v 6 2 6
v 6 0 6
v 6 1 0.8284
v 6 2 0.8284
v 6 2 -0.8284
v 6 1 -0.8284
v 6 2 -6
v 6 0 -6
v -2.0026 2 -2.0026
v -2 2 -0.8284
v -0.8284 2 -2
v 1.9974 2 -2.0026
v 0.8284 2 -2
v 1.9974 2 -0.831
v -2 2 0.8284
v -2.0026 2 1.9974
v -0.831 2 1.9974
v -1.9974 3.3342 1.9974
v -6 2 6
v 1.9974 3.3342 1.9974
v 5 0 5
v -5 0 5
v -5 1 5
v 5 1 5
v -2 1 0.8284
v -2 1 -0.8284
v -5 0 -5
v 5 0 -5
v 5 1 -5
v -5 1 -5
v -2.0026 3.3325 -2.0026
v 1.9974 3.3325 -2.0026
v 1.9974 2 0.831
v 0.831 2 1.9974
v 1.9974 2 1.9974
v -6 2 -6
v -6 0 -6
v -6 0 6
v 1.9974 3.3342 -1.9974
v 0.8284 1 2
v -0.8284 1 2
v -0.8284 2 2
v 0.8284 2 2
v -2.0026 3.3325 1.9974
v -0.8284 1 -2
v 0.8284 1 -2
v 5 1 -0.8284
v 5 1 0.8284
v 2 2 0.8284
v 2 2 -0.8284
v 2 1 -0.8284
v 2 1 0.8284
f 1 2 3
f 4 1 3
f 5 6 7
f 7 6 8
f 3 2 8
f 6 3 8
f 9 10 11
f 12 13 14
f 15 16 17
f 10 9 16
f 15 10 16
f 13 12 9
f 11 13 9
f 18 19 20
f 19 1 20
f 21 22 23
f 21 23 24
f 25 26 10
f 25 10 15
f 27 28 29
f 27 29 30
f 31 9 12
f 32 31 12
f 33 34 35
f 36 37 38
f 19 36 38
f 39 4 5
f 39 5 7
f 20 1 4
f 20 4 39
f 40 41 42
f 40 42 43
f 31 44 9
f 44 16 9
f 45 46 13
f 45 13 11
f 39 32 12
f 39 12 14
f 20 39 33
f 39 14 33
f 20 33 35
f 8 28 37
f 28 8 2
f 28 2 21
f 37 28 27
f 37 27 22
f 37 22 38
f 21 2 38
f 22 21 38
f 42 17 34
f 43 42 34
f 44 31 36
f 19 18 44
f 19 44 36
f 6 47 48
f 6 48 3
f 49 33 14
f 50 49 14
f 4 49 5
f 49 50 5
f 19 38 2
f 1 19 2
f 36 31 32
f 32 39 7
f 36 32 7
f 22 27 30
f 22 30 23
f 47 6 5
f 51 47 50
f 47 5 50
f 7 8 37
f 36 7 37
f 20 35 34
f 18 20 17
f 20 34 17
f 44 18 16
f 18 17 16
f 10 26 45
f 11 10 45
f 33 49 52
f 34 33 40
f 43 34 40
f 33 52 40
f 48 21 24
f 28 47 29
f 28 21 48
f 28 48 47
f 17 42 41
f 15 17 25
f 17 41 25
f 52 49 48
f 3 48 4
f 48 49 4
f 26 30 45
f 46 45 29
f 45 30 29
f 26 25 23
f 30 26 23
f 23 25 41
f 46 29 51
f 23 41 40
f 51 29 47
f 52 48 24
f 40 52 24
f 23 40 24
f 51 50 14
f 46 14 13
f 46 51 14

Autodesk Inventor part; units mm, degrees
ref_plane "YZ Plane" through (0, 0, 0) normal (1, 0, 0) x (0, 1, 0)
ref_plane "XZ Plane" through (0, 0, 0) normal (0, 1, 0) x (-1, 0, 0)
ref_plane "XY Plane" through (0, 0, 0) normal (0, 0, 1) x (1, 0, 0)
sketch "Sketch1" plane through (0, 0, 0) normal (0, 1, 0) x (-1, 0, 0)
  line L0 (5, 5) -> (-5, 5)
  line L1 (-5, 5) -> (-5, -5)
  line L2 (-5, -5) -> (5, -5)
  line L3 (5, -5) -> (5, 5)
  line L4 (6, 6) -> (-6, 6)
  line L5 (-6, 6) -> (-6, -6)
  line L6 (-6, -6) -> (6, -6)
  line L7 (6, -6) -> (6, 6)
  point P0 (0, 0)
  dimension "d0" = 10
  dimension "d1" = 10
  dimension "d2" = 5
  dimension "d3" = 5
  dimension "d4" = 12
  dimension "d5" = 12
  dimension "d6" = 1
  dimension "d7" = 1
extrude "Extrusion1" add sketch "Sketch1" along normal blind 2
sketch "Sketch2" plane through (6, 0, 6) normal (1, 0, 0) x (0, 0, -1)
  line L0 (0, 0) -> (0, 2) projected
  line L1 (12, 0) -> (12, 2) projected
  line L2 (0, 2) -> (12, 2)
  line L3 (12, 2) -> (12, 1)
  line L4 (12, 1) -> (0, 1)
  line L5 (0, 1) -> (0, 2)
  point P0 (6, 0)
extrude "Extrusion2" add sketch "Sketch2" against normal blind 11.5
sketch "Sketch3" plane through (0, 2, 0) normal (0, 1, 0) x (1, 0, 0)
  line L0 (-2, -2) -> (2, -2)
  line L1 (2, -2) -> (2, 2)
  line L2 (2, 2) -> (-2, 2)
  line L3 (-2, 2) -> (-2, -2)
  circle A0 centre (0, 0) radius 2.8284
  line L4 (0, -2.8284) -> (-2.8284, 0)
  line L5 (-2.8284, 0) -> (0, 2.8284)
  line L6 (2.8284, 0) -> (0, 2.8284)
  line L7 (2.8284, 0) -> (0, -2.8284)
  point P0 (0.8284, -2)
  point P1 (2, -0.8284)
  point P2 (2, 0.8284)
  point P3 (0.8284, 2)
  point P4 (-0.8284, 2)
  point P5 (-2, 0.8284)
  point P6 (-2, -0.8284)
  point P7 (-0.8284, -2)
  dimension "d13" = 4
  dimension "d14" = 4
  dimension "d15" = 2
  dimension "d16" = 2
extrude "Extrusion3" cut sketch "Sketch3" along normal blind 23.25 and the other way blind 11.625 contours L4 L3 L5 L2 L6 L1 L7 L0
sketch "Sketch4" plane through (0, 2, 0) normal (0, 1, 0) x (1, 0, 0)
  line L0 (2, -0.8284) -> (2, 0.8284) projected
  line L1 (2, -0.8284) -> (2.8765, -0.8284)
  line L2 (2.8765, -0.8284) -> (2.8765, 0.8284)
  line L3 (2.8765, 0.8284) -> (2, 0.8284)
  line L4 (2, 0.8284) -> (2, -0.8284)
  line L5 (2.8765, -0.8284) -> (7.5124, -0.8284)
  line L6 (7.5124, -0.8284) -> (7.5124, 0.8284)
  line L7 (7.5124, 0.8284) -> (2.8765, 0.8284)
  line L8 (2.8765, 0.8284) -> (2.8765, -0.8284)
  point P0 (0, 0)
  point P1 (2.8765, 0.8284)
  point P2 (2, 0.8284)
extrude "Extrusion4" cut sketch "Sketch4" against normal blind 1
sketch "Sketch5" plane through (0, 2, 0) normal (0, 1, 0) x (1, 0, 0)
  line L0 (-6, -6) -> (6, -6) projected
  line L1 (6, 0.8284) -> (6, 6) projected
  line L2 (-6, -6) -> (6, -6)
  line L3 (6, -6) -> (6, 6)
  line L4 (6, 6) -> (-6, 6)
  line L5 (-6, 6) -> (-6, -6)
  point P0 (0, 0)
  point P1 (6, -6)
extrude "Extrusion5" add sketch "Sketch5" along normal blind 25
sketch "Sketch6" plane through (6, 0, 6) normal (1, 0, 0) x (0, 0, -1)
  line L0 (5.1716, 1) -> (5.1716, 2) projected
  line L1 (5.1716, 2) -> (-3.596, 2)
  line L2 (0, 0) -> (0, 27) projected
  line L3 (4, 2) -> (5.1716, 2) projected
  line L4 (5.1716, 2) -> (16.1787, 2)
  line L5 (5.1716, 2) -> (6.8284, 2) projected
  line L6 (6, 2) -> (6, 6)
  line L7 (0, 2) -> (6, 4)
  line L8 (6, 4) -> (12, 2)
  line L9 (12, 0) -> (12, 27) projected
  line L10 (12, 2) -> (-2.4689, 2)
  line L11 (-2.4689, 2) -> (-2.4689, 28.669)
  line L12 (-2.4689, 28.669) -> (12, 28.669)
  line L13 (12, 28.669) -> (12, 2)
  point P0 (6, 0)
  dimension "d23" = 4
extrude "Extrusion6" cut sketch "Sketch6" against normal blind 23.25 contours L1 L11 L12 L13 L9 L8 L7
sketch "Sketch7" plane through (-6, 0, 6) normal (0, 0, 1) x (1, 0, 0)
  line L0 (6, 0) -> (6, 4)
  line L1 (12, 4) -> (0, 4) projected
  line L2 (0, 2) -> (12, 2) projected
  line L3 (12, 2) -> (6, 4)
  line L4 (0, 4) -> (0, 2) projected
  line L5 (6, 4) -> (0, 2)
  line L6 (0, 2) -> (13.6732, 2)
  line L7 (13.6732, 2) -> (13.6732, 4.9606)
  line L8 (13.6732, 4.9606) -> (0, 4.9606)
  line L9 (0, 4.9606) -> (0, 2)
extrude "Extrusion7" cut sketch "Sketch7" against normal blind 41.75 contours L5 L4 L1 | L1 L9 L8 L7 L6 L3
sketch "Sketch8" plane through (0, 2, 0) normal (0, -1, 0) x (1, 0, 0)
  line L0 (6, 6) -> (0, 0) projected
  line L1 (1.9974, 1.9974) -> (-2.0026, 1.9974)
  line L2 (-2.0026, 1.9974) -> (-2.0026, -2.0026)
  line L3 (-2.0026, -2.0026) -> (1.9974, -2.0026)
  line L4 (1.9974, -2.0026) -> (1.9974, 1.9974)
  dimension "d30" = 4
  dimension "d31" = 4
extrude "Extrusion8" cut sketch "Sketch8" against normal blind 105
equation "\"d2\" = 0.5 * d0"
equation "\"d3\" = 0.5 * d1"
equation "\"d15\" = 0.5 * d13"
equation "\"d16\" = 0.5 * d14"
equation "\"BendRadius\" = Thickness"
equation "\"BendReliefWidth\" = Thickness"
equation "\"BendReliefDepth\" = 0.5 * Thickness"
equation "\"CornerReliefSize\" = 4 * Thickness"
equation "\"MinimumRemnant\" = 2 * Thickness"
equation "\"TransitionRadius\" = BendRadius"
equation "\"JacobiRadiusSize\" = BendRadius"
equation "\"GapSize\" = Thickness"
equation "\"Thickness\" = 0.5"
properties part number "modelGatePoklice1"
